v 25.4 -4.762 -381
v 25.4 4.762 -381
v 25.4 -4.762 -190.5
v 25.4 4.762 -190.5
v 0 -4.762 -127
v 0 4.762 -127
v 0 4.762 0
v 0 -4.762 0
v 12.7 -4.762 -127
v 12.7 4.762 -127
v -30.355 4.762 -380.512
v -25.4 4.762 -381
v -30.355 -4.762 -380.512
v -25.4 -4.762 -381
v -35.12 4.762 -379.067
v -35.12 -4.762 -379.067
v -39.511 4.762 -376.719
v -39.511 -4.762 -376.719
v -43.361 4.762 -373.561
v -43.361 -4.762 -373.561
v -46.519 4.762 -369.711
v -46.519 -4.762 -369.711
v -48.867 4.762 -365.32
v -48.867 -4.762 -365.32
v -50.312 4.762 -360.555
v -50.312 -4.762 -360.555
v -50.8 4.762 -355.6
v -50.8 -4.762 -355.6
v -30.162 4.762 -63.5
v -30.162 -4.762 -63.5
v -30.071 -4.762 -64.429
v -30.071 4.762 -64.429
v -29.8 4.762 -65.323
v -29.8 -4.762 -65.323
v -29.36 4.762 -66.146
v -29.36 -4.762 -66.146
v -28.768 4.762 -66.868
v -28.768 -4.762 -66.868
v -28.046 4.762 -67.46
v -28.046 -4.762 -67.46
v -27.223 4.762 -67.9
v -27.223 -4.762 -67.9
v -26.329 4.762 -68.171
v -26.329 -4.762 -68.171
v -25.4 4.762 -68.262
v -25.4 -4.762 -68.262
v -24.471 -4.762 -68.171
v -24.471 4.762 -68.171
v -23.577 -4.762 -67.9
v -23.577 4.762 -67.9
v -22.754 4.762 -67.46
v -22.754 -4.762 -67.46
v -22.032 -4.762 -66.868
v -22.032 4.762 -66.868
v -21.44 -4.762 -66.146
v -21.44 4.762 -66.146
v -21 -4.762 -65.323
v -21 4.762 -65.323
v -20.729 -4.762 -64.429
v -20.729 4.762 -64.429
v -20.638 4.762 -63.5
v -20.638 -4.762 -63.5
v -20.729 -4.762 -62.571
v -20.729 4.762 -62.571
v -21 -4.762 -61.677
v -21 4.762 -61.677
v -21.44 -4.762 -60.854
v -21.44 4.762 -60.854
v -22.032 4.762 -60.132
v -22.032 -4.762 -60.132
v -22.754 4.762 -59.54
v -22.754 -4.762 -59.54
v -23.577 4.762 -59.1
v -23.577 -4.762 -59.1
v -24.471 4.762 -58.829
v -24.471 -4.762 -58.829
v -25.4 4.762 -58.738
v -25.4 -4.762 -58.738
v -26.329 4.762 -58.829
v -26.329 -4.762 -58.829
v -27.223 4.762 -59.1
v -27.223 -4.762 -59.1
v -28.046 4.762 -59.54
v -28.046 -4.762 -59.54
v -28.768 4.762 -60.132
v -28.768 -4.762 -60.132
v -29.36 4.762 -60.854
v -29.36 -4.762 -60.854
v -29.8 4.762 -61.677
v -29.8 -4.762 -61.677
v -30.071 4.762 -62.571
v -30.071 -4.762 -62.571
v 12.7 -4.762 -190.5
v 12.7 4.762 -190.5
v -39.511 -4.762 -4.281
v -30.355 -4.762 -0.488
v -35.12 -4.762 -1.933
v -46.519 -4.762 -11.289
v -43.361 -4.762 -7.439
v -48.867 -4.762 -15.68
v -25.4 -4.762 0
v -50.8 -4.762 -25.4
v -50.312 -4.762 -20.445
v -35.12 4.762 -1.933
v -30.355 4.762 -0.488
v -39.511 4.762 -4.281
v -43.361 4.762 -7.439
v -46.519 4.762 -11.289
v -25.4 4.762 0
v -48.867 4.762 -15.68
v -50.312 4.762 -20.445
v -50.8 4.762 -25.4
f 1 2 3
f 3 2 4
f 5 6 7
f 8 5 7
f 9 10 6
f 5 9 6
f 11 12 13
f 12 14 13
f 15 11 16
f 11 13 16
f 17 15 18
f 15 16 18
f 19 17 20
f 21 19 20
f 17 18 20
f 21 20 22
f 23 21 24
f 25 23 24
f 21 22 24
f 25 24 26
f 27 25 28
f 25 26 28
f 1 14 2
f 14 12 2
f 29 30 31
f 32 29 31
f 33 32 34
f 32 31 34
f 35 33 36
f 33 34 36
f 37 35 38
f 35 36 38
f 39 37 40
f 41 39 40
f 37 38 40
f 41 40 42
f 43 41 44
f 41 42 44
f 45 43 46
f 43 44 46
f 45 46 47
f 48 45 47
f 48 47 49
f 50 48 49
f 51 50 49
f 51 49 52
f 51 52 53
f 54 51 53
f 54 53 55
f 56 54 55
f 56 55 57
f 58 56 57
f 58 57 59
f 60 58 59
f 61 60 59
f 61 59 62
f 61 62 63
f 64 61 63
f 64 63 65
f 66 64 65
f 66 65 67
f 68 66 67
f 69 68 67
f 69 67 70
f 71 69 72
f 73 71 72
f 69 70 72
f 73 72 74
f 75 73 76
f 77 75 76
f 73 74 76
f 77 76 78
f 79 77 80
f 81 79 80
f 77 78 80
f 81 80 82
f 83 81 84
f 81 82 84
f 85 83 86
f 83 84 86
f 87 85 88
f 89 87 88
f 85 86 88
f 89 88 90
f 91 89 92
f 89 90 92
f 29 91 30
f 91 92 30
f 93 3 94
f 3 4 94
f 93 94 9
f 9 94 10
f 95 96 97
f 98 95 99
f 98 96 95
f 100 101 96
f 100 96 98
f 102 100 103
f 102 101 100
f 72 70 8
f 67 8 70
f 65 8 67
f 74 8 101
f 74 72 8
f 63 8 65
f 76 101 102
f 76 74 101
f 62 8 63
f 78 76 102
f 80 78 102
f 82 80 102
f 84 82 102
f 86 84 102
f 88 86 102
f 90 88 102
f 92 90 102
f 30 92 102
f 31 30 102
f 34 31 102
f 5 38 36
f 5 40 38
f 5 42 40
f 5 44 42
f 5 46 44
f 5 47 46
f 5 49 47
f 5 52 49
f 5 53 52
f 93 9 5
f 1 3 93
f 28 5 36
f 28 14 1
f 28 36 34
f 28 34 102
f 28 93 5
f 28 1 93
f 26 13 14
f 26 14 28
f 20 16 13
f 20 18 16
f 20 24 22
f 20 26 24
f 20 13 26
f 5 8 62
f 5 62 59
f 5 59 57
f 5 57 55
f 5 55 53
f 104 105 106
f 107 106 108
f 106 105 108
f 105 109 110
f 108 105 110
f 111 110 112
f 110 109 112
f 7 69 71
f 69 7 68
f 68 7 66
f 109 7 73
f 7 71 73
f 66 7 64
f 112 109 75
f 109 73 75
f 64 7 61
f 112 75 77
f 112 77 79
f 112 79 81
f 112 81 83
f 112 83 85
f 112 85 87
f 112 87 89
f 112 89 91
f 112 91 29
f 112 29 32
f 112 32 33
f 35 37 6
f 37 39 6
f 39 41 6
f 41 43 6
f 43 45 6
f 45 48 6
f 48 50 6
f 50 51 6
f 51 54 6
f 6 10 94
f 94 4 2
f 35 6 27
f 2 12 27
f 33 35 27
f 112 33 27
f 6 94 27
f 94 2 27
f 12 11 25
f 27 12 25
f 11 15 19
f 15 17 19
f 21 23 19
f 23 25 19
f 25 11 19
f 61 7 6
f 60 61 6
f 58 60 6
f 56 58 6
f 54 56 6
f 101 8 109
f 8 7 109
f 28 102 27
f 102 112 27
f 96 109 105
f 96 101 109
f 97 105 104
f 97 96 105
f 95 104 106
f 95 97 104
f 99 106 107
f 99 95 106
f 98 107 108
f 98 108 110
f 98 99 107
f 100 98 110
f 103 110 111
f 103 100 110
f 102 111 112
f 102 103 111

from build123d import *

# Parameters (mm, degrees)
BOSS_EXTRUDE1_DEPTH              = 4.7625
FILLET1_R                        = 25.4
F_3_8_0_375_DIAMETER_HOLE1_D     = 9.525
F_3_8_0_375_DIAMETER_HOLE1_DEPTH = 11.684
F_3_8_0_375_DIAMETER_HOLE1_TIP   = 2.861598698


with BuildPart() as part:
    # Sketch1 → Boss-Extrude1 (new body, symmetric)
    with BuildSketch(Plane(origin=(0, 0, 0), x_dir=(1, 0, 0), z_dir=(0, 1, 0))):
        Polygon((0, 0), (-50.8, 0), (-50.8, 381), (25.4, 381), (25.4, 190.5), (12.7, 190.5), (12.7, 127), (0, 127), align=None)
    extrude(amount=BOSS_EXTRUDE1_DEPTH, both=True)

    # Fillet1
    fillet1_edges = [part.edges().sort_by_distance(p)[0] for p in [
        (-50.8, 0, 0),
        (-50.8, 0, -381),
    ]]
    fillet(fillet1_edges, radius=FILLET1_R)

    # 3/8 (0.375) Diameter Hole1
    with Locations(Plane(origin=(0, 4.7625, 0), x_dir=(1, 0, 0), z_dir=(0, 1, 0))):
        with Locations((-25.4, 63.5)):
            Hole(F_3_8_0_375_DIAMETER_HOLE1_D / 2, depth=F_3_8_0_375_DIAMETER_HOLE1_DEPTH)
            with Locations((0, 0, -(F_3_8_0_375_DIAMETER_HOLE1_DEPTH + F_3_8_0_375_DIAMETER_HOLE1_TIP / 2))):  # 118° drill point
                Cone(0, F_3_8_0_375_DIAMETER_HOLE1_D / 2, F_3_8_0_375_DIAMETER_HOLE1_TIP, mode=Mode.SUBTRACT)


solid = part.part
